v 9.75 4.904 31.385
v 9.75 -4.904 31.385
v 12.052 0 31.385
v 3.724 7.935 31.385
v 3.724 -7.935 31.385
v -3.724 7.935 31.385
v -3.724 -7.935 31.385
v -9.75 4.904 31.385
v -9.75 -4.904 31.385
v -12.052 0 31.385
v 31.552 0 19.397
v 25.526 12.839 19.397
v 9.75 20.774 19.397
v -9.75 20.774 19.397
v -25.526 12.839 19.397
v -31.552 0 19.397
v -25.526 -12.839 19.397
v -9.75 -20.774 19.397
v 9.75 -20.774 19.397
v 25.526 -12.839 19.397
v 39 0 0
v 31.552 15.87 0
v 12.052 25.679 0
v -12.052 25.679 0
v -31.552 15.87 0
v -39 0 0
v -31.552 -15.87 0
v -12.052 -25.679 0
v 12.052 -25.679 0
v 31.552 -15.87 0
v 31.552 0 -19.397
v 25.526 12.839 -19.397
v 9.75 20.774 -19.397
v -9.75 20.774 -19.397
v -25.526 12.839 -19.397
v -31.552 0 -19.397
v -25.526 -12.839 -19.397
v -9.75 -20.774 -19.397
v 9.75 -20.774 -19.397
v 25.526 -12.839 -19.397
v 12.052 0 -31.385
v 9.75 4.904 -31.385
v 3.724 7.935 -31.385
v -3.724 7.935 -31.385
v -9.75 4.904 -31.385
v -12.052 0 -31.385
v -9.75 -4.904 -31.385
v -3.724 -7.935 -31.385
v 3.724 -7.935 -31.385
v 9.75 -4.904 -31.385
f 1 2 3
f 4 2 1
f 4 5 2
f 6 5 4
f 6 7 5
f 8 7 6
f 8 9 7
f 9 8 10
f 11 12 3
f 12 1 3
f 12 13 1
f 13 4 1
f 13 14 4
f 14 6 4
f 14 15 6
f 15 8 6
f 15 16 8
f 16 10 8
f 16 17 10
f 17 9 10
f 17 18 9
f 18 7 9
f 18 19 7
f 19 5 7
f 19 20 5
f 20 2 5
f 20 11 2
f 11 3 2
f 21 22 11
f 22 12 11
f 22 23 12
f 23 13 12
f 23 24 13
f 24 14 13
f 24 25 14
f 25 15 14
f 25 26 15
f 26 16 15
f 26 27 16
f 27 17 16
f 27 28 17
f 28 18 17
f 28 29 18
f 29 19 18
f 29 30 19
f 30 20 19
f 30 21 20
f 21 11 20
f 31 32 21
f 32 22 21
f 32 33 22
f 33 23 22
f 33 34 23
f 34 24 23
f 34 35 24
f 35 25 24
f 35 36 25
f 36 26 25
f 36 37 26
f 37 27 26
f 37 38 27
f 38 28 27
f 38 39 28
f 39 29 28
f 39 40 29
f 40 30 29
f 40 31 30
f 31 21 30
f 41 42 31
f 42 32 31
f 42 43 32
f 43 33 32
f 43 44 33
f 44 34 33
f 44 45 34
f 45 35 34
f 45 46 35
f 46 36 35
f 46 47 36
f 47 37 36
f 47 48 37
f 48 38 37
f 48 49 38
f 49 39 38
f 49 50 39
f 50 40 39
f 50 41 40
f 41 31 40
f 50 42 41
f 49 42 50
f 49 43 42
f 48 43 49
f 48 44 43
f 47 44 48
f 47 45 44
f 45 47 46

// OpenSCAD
// Generated by SolidPython 1.0.1 on 2020-07-29 00:46:50


scale(v = [13, 9, 11]) {
	sphere(r = 3);
}
/***********************************************
*********      SolidPython code:      **********
************************************************
 
# import packages: SolidPython
from solid import *
from solid.utils import *
from itertools import chain, combinations, permutations


class Resize:

    def __init__(self, scad_file):
        self.scad_file = scad_file
        #self.scad_file = import_scad(scad_file)
        # cone/cylinder param:
        self.r1 = 0
        self.r2 = 0
        self.h = 0
        # rectangular prism param:
        self.w = 0
        self.l = 0
        # ellipse param:
        self.r = 0

    # import OpenScad code (file name corresponds to shape)


    # classify shape + parameters
    def assign(self, param1, param2, param3):
        if self.scad_file == 'cone.scad':
            self.r1 = param1
            self.r2 = param2
            self.h = param3
        elif self.scad_file == 'cylinder.scad':
            self.r1 = param1
            self.r2 = param2
            self.h = param3
        elif self.scad_file == 'rectangularPrism.scad':
            self.h = param1
            self.l = param2
            self.w = param3
        else:
            self.r = param1
            self.h = param2

    # resize parameters
    def iterate(self):
        x = range(3, 20, 2)
        i = 1
        if self.scad_file == 'cone.scad':
            tempList = list(permutations(x, 2))
            for temp in tempList:
                param1 = temp[0]
                param2 = temp[1]
                filepath = 'produced_scad_files/' + 'cone' + str(param1) + '_' + str(param2) + '_' + '.scad'
                scad_render_to_file(cylinder(h=param1, r1=param2, r2=0), filepath)

        elif self.scad_file == 'cylinder.scad':
            tempList = list(permutations(x, 3))
            for temp in tempList:
                param1 = temp[0]
                param2 = temp[1]
                filepath = 'produced_scad_files/' + 'cylinder' + str(param1) + '_' + str(param2) + '_' + '.scad'
                scad_render_to_file(cylinder(h=param1, r1=param2, r2=param2), filepath)

        elif self.scad_file == 'rectangularPrism.scad':
            tempList = list(permutations(x, 3))
            for temp in tempList:
                param1 = temp[0]
                param2 = temp[1]
                param3 = temp[2]
                filepath = 'produced_scad_files/' + 'rectangularPrism' + str(param1) + '_' + str(param2) + '_' + str(
                    param3) + '.scad'
                scad_render_to_file(cube(size=(param1, param2, param3)), filepath)

        elif self.scad_file == 'ellipse.scad':
            tempList = list(permutations(x, 4))
            for temp in tempList:
                param1 = temp[0]
                param2 = temp[1]
                param3 = temp[2]
                param4 = temp[3]
                filepath = 'produced_scad_files/' + 'ellipse' + str(param1) + '_' + str(param2) + '_' + str(param3) + '_' + str(param4) + '.scad'
                scad_render_to_file(scale([param1, param2, param3])(sphere(r=param4)), filepath)

    def render_to_scadfile(self):
        scad_render_to_file(scad, 'example.scad') 
 
************************************************/
